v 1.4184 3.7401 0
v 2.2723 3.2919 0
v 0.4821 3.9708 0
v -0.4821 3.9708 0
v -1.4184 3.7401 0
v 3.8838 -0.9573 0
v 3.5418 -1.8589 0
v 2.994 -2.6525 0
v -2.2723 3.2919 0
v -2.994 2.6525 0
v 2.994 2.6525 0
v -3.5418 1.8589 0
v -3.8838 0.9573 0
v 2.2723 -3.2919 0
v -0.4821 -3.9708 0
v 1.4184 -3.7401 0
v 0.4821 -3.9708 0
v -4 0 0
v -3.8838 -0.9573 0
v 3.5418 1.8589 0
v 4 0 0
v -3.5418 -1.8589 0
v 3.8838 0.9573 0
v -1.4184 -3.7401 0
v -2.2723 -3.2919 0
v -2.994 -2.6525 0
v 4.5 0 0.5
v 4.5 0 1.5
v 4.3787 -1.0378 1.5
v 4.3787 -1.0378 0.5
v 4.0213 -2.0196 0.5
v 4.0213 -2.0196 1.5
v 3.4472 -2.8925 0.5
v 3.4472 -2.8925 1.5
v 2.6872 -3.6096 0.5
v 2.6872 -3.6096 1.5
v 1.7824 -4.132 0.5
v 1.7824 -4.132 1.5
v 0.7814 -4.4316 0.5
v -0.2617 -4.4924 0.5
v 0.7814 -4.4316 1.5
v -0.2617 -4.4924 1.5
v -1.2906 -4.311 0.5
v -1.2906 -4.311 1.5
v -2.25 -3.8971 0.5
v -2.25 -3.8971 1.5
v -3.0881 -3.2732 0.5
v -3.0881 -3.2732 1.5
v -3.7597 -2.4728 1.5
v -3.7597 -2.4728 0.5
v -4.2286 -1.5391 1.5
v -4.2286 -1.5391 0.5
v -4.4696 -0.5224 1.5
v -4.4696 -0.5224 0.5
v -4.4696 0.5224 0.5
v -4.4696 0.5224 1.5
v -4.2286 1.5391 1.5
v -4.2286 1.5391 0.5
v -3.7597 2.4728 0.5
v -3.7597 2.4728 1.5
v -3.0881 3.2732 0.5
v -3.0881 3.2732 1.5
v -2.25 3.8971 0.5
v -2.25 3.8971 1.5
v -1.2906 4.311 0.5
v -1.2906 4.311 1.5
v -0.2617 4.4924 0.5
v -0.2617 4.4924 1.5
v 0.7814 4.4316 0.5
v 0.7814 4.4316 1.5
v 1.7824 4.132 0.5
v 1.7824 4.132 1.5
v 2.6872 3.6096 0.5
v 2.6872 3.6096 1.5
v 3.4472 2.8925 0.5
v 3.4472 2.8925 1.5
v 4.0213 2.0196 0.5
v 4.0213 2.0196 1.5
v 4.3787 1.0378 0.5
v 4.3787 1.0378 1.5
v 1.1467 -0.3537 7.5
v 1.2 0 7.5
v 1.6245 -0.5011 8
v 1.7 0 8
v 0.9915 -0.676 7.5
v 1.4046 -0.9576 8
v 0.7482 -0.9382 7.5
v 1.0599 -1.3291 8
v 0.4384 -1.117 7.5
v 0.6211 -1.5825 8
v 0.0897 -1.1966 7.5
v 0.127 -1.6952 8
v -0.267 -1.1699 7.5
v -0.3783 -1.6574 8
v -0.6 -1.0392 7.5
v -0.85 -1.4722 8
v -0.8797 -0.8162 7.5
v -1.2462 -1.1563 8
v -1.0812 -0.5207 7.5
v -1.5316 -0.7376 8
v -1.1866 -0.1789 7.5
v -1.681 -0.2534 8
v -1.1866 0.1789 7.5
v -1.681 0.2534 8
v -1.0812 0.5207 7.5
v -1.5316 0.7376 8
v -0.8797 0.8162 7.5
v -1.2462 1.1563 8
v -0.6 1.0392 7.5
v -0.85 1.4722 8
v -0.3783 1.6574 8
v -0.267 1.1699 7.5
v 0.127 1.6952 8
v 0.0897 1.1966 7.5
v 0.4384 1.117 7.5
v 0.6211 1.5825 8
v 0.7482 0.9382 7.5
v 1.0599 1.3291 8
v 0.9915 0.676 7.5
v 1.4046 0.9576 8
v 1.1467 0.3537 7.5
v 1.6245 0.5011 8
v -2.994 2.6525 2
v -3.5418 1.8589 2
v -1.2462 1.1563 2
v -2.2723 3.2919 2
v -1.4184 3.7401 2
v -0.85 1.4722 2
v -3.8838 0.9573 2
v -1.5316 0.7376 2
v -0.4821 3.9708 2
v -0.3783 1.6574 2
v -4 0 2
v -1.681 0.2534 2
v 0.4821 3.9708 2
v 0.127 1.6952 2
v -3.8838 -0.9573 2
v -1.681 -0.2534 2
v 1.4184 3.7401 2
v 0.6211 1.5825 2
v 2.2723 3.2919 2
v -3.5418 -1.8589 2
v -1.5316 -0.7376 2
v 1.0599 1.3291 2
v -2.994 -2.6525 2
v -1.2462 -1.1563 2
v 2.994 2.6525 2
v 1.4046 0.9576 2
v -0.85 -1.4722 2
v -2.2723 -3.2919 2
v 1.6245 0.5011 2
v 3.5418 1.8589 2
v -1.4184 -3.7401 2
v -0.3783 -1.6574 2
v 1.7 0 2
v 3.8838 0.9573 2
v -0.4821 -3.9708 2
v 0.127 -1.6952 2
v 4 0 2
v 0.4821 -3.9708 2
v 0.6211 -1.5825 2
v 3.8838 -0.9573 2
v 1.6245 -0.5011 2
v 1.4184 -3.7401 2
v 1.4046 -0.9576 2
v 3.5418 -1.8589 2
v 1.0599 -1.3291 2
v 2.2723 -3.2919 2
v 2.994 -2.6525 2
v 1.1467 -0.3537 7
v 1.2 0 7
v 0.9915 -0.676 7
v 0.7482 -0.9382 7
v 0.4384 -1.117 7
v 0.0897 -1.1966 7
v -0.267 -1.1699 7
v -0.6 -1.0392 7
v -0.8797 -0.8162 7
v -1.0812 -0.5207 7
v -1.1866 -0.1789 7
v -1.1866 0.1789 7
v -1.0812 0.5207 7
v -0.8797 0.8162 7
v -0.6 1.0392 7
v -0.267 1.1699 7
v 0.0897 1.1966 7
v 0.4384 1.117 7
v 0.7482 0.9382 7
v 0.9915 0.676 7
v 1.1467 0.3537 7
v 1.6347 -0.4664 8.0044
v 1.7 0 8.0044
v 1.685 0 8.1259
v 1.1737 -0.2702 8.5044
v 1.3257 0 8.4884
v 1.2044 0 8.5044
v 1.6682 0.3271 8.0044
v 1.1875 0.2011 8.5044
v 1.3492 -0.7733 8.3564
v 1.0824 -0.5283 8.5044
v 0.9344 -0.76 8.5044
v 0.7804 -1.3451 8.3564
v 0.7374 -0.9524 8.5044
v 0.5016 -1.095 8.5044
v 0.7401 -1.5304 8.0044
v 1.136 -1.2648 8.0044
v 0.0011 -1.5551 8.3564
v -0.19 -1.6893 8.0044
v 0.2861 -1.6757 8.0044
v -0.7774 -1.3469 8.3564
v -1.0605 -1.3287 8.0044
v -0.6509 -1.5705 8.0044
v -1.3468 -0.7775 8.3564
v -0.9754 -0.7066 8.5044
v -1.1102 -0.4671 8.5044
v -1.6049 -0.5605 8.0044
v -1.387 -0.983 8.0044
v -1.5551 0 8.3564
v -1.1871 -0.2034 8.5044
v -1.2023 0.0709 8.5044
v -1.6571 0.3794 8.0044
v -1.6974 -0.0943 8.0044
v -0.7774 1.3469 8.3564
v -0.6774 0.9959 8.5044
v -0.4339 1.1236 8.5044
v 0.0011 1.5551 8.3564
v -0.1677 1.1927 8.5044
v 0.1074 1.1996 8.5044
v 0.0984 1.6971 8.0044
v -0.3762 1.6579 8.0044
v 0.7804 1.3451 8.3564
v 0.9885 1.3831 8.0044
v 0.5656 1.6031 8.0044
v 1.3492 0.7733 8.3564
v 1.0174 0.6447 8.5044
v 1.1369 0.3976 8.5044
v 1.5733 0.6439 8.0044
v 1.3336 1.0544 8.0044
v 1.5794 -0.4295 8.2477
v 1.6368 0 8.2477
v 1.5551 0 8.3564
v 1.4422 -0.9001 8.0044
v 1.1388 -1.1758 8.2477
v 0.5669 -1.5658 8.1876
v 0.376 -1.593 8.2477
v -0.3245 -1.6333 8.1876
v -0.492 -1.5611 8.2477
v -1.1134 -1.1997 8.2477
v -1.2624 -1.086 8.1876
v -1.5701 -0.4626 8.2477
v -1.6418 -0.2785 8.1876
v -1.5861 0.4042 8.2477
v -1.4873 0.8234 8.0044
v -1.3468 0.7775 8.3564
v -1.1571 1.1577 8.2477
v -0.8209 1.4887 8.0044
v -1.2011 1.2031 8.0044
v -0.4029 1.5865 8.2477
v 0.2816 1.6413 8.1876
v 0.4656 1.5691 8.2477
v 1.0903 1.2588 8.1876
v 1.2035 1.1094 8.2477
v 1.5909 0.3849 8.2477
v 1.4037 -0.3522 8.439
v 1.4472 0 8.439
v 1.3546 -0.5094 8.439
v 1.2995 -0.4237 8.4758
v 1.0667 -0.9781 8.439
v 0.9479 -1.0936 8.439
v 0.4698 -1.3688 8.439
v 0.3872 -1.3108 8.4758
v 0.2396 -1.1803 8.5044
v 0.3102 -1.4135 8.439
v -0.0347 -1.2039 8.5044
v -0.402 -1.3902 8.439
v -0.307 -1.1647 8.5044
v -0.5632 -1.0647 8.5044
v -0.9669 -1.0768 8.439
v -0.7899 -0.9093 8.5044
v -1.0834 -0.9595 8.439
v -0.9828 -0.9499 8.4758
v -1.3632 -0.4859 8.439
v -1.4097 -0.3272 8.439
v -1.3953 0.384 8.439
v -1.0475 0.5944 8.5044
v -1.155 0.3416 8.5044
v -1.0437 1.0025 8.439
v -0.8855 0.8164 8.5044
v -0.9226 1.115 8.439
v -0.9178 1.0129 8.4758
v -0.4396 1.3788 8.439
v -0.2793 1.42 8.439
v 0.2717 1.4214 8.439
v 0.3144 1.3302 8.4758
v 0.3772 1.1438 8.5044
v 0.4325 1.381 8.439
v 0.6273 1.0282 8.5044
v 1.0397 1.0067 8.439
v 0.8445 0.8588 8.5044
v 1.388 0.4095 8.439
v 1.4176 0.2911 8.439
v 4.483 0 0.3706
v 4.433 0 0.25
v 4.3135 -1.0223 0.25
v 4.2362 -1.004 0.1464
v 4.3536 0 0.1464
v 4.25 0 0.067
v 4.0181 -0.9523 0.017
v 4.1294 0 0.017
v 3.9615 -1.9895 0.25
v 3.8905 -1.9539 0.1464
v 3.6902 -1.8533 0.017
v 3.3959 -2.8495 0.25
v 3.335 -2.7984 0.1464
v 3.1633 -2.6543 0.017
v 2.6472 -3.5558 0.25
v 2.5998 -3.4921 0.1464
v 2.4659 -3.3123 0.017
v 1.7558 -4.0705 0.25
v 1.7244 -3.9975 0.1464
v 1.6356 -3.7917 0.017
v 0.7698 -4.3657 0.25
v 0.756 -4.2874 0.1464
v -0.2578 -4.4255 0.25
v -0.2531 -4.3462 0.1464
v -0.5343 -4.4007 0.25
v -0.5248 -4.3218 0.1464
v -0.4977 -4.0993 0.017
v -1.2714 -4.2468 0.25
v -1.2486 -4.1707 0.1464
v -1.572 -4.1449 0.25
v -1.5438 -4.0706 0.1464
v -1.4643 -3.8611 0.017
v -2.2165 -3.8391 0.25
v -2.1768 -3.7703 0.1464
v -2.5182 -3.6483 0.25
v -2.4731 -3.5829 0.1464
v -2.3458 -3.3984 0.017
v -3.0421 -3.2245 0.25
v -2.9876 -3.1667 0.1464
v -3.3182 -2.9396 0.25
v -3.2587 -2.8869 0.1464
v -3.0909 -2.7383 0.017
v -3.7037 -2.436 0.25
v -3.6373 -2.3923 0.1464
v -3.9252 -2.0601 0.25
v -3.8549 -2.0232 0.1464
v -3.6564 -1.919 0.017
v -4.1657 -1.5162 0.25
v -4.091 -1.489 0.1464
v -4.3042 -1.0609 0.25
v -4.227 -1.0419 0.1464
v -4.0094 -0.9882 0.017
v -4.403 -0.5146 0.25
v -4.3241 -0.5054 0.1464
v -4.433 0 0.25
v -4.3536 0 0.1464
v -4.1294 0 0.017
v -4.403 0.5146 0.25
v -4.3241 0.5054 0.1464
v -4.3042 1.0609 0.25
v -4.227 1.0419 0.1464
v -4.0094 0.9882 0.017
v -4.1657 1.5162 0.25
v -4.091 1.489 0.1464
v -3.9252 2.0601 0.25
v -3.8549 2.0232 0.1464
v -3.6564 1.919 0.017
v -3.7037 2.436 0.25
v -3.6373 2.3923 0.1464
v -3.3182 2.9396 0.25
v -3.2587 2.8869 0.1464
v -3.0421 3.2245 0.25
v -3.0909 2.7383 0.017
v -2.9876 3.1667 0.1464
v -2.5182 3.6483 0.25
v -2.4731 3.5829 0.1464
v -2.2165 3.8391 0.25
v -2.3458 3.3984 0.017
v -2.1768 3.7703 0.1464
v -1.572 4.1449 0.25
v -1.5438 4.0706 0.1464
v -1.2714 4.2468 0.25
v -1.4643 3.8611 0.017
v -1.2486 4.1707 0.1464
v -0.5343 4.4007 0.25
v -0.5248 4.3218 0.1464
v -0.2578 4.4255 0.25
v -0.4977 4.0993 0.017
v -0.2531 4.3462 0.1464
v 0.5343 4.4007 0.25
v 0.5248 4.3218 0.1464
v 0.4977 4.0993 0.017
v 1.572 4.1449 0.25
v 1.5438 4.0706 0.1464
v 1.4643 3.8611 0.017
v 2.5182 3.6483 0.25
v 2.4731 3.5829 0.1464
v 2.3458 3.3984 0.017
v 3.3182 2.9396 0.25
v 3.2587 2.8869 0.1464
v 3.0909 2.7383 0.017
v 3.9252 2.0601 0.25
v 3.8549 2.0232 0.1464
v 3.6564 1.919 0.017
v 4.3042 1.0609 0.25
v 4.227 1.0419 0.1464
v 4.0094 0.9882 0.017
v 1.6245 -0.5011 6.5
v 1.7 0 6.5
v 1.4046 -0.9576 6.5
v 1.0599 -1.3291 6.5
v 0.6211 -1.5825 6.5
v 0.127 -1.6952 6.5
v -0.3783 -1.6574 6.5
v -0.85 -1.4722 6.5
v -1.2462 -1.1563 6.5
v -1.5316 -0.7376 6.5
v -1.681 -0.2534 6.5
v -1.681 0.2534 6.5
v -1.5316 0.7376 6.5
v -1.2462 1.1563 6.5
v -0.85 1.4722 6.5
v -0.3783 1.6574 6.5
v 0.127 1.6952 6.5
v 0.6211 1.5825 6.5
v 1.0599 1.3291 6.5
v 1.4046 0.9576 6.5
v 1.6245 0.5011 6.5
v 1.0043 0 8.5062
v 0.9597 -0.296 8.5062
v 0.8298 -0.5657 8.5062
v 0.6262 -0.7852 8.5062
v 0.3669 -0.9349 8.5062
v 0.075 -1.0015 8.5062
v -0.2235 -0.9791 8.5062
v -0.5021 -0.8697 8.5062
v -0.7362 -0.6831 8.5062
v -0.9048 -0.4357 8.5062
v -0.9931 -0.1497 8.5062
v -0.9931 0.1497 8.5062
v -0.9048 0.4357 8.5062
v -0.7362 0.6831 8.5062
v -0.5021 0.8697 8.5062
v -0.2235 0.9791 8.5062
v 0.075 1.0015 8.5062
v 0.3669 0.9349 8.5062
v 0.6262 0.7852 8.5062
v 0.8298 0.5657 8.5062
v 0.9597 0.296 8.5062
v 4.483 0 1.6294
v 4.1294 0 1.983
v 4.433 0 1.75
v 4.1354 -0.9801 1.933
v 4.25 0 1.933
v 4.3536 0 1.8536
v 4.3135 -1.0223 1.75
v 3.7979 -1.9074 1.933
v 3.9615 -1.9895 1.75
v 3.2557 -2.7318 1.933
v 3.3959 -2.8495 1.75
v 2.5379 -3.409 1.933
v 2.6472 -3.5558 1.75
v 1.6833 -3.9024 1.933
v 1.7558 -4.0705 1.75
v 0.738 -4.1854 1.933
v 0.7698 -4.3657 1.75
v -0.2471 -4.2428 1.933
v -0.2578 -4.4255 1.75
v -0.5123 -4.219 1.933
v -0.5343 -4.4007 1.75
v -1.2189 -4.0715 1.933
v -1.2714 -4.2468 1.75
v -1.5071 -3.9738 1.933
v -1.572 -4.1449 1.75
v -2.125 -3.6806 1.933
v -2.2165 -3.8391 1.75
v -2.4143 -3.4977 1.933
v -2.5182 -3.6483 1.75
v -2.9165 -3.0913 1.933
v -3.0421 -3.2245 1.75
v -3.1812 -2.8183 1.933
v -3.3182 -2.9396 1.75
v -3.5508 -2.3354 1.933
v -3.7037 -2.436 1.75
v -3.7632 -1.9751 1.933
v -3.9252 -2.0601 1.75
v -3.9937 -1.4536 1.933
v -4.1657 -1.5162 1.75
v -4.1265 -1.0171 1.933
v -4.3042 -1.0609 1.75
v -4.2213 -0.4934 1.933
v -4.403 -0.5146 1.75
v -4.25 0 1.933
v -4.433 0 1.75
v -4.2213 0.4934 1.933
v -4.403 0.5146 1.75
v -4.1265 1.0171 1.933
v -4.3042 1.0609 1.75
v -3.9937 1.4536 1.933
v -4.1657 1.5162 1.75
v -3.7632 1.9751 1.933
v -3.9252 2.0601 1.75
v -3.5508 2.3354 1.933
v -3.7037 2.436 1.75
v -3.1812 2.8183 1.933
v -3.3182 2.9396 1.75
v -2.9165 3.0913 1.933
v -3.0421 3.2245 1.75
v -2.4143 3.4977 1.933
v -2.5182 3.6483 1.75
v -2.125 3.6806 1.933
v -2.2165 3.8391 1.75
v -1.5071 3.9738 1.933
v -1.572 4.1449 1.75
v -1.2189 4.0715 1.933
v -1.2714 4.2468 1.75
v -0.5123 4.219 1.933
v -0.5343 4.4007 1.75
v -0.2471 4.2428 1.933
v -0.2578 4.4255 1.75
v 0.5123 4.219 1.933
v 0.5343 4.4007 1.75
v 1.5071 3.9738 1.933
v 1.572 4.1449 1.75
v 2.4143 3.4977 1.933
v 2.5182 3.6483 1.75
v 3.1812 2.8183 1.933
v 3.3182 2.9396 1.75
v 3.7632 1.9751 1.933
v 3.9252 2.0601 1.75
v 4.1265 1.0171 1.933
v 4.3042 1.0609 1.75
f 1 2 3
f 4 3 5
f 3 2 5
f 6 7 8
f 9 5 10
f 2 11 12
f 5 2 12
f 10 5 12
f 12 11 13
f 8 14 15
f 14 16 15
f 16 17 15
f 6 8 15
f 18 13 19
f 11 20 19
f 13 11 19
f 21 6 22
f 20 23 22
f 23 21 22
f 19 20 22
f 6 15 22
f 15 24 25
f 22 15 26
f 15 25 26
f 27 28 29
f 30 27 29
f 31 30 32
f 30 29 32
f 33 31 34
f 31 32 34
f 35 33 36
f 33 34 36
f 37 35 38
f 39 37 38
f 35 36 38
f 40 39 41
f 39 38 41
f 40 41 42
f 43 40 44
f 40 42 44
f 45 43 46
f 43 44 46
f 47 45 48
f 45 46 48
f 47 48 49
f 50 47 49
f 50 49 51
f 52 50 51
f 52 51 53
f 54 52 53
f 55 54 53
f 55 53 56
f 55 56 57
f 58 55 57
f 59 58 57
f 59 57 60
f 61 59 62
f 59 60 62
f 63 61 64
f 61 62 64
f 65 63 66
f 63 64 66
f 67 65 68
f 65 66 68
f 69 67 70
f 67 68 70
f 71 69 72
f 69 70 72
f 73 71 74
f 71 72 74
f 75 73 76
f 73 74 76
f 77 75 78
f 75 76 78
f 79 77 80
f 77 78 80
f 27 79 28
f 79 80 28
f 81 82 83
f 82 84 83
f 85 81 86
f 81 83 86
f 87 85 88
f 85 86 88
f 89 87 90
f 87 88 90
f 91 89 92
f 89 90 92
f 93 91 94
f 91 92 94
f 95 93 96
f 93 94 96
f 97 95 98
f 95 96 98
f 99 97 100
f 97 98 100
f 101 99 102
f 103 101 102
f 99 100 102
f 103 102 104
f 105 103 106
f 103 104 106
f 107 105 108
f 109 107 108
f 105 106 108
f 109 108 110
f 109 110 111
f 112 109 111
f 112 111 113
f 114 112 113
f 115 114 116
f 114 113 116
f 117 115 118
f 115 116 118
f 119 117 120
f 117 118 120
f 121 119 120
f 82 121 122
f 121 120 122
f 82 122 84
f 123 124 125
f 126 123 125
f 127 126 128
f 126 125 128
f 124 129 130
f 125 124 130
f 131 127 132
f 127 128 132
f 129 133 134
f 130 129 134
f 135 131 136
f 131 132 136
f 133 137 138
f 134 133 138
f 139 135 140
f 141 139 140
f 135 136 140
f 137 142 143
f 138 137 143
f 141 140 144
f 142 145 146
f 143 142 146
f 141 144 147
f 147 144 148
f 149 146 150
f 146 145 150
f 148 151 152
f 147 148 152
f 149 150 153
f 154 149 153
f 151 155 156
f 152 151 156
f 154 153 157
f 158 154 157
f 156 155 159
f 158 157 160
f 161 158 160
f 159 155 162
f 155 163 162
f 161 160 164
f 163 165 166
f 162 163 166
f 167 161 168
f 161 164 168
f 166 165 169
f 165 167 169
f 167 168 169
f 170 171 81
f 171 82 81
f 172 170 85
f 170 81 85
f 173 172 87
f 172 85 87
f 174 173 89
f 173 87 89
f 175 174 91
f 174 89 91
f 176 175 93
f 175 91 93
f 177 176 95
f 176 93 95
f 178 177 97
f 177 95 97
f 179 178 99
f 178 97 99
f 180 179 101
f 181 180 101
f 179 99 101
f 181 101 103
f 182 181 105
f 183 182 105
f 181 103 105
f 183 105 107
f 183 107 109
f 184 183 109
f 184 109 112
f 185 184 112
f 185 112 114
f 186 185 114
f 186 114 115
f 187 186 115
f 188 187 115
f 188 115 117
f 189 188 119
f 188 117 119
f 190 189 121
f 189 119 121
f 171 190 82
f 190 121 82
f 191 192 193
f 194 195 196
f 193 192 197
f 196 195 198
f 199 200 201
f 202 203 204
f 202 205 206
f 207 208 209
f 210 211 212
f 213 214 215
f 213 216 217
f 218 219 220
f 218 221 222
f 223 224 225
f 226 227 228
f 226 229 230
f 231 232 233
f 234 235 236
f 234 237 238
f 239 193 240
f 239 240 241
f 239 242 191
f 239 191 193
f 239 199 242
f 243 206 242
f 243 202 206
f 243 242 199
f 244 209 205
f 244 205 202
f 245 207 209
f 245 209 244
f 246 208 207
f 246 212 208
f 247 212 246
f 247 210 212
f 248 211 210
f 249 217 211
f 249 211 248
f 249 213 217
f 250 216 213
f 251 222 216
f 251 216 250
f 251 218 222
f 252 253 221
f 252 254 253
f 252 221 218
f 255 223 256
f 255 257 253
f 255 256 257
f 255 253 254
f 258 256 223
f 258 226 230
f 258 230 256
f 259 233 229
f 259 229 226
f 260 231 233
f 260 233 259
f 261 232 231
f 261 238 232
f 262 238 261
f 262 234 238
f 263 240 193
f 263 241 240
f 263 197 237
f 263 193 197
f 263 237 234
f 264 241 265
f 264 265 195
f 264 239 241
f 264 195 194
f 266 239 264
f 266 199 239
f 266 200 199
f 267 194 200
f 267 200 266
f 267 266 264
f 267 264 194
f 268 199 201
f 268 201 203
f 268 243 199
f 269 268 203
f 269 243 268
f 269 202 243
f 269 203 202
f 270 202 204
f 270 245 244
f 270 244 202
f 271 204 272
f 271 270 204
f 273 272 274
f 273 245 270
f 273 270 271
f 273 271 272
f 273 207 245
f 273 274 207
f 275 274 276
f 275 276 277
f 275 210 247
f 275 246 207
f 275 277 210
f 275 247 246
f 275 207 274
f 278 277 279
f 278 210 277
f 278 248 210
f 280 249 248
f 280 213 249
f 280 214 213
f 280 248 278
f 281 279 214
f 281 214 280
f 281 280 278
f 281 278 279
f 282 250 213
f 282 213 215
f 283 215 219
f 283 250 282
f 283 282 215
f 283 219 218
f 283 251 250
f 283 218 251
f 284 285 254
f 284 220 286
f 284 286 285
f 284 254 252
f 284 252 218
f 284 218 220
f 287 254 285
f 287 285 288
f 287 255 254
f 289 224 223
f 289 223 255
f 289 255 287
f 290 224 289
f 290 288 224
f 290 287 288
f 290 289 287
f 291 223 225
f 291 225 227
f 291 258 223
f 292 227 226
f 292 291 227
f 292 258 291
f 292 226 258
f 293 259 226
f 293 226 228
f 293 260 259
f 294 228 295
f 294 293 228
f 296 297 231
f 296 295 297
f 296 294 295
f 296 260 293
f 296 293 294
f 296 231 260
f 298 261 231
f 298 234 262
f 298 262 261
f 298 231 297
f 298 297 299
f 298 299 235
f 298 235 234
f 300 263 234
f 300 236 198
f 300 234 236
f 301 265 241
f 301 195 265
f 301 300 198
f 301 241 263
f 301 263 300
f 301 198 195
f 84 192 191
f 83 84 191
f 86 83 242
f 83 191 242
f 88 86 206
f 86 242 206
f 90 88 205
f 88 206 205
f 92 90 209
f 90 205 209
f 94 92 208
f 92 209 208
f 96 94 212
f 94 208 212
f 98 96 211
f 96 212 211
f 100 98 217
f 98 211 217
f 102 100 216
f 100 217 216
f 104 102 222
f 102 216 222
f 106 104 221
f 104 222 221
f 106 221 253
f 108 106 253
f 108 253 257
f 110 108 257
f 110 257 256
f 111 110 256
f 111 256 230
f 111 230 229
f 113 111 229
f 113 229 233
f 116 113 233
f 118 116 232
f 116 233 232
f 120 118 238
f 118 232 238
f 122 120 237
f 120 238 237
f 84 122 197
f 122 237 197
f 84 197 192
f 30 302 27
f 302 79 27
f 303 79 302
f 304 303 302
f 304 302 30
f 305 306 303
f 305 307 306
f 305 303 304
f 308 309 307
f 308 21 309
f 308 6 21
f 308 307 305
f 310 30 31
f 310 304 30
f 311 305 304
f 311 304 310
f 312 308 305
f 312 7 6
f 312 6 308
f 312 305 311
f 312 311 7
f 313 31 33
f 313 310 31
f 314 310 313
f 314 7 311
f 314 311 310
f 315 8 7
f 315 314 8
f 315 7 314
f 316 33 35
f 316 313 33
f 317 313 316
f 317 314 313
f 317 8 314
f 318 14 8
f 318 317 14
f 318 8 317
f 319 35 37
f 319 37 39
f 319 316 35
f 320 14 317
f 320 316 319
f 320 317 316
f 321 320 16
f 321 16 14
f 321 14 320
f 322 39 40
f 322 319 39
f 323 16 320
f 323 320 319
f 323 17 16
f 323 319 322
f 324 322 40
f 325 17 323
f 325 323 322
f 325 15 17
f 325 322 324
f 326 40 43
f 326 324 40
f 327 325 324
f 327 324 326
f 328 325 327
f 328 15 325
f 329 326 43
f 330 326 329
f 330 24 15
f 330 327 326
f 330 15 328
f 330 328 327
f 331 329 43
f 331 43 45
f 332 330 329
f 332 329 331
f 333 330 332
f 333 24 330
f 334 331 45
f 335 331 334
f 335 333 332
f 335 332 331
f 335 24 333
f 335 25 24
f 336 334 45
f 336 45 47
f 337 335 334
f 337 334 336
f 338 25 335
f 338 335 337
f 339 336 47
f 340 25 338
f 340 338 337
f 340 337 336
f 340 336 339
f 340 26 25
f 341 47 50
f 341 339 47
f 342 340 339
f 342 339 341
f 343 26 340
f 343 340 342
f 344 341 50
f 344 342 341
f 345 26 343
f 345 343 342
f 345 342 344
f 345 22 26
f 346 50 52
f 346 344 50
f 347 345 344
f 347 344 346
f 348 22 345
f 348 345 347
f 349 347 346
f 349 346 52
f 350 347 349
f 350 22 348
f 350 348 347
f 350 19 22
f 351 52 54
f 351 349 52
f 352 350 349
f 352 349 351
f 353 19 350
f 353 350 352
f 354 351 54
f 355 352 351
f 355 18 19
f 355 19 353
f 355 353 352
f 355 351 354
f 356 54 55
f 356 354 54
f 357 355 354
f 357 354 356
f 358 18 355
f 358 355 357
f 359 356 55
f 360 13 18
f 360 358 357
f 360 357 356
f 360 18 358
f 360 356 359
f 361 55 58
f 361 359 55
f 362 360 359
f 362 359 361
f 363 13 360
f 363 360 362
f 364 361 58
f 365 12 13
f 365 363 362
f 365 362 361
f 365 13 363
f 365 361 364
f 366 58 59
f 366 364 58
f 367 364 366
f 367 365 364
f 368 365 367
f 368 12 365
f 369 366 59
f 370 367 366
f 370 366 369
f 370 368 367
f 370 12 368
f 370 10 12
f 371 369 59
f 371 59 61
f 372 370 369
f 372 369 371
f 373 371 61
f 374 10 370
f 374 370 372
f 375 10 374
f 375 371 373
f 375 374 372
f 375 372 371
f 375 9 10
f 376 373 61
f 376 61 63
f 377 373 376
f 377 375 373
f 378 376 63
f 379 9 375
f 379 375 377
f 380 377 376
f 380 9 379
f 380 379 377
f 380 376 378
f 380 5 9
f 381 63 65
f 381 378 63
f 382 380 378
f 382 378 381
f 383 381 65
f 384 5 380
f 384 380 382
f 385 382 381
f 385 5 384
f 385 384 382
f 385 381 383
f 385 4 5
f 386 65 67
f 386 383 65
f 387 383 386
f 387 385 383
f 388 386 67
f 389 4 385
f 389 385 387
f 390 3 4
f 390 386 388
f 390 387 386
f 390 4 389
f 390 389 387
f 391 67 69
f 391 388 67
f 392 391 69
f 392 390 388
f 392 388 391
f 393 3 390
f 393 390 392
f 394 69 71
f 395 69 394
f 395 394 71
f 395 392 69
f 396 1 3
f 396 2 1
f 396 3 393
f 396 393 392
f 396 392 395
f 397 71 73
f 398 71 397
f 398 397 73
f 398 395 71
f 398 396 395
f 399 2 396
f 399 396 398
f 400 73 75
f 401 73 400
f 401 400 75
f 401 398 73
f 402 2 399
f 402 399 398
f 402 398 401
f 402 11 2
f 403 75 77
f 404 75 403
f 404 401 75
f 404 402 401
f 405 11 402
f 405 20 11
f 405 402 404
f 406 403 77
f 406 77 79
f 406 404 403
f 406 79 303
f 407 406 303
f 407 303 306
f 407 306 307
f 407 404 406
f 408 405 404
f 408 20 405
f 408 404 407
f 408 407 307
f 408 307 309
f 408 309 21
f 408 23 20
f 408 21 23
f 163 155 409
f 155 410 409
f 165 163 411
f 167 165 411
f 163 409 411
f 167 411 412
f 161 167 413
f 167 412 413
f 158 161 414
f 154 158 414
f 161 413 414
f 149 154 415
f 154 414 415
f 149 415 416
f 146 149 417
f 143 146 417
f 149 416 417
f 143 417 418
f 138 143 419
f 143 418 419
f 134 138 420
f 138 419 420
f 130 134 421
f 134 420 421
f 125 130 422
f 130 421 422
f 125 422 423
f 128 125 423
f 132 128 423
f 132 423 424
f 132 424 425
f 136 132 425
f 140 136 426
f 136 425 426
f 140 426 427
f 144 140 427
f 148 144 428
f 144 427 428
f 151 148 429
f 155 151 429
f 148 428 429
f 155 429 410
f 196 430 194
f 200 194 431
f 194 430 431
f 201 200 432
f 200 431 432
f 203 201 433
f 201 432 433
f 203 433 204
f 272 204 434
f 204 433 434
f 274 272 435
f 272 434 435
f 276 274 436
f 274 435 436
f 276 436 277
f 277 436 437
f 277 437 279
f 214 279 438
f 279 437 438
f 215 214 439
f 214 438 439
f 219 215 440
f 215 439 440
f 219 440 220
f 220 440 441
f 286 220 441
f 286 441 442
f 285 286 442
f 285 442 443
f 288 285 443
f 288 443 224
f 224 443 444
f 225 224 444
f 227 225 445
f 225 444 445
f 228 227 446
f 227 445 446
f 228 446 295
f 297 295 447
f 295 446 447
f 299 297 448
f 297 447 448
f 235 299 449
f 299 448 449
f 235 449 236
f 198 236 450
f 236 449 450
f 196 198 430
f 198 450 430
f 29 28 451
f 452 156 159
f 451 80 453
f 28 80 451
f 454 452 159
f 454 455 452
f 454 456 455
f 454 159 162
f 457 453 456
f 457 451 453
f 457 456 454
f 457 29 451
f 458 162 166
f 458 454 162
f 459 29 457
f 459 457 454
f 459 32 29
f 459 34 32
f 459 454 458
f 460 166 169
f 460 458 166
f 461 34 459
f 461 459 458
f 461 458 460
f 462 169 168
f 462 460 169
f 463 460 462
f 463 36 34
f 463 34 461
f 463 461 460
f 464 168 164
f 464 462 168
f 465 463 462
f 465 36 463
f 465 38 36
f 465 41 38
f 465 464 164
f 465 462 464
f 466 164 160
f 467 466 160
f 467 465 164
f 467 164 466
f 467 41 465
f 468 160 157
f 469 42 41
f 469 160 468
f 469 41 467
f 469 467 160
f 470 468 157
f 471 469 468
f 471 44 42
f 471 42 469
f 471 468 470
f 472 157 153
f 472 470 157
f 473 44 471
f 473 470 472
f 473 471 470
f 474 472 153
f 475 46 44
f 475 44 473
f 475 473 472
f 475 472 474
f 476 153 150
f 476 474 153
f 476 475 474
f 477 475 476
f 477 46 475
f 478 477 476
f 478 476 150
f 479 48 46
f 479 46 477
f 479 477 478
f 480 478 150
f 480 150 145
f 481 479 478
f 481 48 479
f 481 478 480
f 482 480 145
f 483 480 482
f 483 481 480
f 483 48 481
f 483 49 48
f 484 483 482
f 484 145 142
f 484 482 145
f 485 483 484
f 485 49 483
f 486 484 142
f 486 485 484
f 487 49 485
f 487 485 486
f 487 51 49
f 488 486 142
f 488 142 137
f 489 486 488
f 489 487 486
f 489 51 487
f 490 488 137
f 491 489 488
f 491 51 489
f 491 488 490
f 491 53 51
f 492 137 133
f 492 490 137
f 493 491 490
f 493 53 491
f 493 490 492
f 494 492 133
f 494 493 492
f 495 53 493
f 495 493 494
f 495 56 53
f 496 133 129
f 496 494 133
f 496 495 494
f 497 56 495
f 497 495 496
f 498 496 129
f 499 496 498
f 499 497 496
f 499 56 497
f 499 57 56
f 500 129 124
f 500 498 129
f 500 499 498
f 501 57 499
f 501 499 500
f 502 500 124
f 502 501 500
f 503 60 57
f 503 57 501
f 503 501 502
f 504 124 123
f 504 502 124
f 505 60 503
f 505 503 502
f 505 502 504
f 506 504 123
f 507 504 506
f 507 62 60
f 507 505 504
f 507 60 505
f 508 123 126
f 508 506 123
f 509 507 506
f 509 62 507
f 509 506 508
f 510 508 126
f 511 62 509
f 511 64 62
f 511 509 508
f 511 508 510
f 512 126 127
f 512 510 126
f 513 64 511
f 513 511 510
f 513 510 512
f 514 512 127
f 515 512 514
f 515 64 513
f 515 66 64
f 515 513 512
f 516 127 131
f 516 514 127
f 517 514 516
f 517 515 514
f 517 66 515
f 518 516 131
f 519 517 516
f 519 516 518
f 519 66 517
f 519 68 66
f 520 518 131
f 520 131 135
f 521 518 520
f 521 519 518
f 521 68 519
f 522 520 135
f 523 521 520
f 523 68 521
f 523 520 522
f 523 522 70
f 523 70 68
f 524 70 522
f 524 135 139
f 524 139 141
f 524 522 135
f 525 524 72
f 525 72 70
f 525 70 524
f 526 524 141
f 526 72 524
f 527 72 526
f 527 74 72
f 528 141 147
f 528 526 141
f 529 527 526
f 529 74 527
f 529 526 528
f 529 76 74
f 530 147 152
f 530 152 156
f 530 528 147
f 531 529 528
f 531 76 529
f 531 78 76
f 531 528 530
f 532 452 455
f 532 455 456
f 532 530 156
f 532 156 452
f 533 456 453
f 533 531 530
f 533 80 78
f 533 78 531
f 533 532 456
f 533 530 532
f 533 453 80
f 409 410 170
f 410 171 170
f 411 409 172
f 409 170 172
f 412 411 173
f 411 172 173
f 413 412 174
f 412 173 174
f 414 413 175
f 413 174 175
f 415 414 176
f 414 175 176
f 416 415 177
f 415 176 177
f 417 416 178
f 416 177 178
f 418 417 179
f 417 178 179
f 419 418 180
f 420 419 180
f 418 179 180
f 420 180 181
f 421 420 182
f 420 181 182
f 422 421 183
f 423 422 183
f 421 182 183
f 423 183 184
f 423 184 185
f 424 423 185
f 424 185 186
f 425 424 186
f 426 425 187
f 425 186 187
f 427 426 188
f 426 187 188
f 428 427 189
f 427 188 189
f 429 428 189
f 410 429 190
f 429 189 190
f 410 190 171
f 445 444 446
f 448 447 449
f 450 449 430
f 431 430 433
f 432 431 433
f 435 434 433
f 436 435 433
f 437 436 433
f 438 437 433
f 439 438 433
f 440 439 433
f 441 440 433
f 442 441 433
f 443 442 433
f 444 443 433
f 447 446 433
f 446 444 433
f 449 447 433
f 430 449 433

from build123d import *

# Parameters (mm, degrees)
F2_R = 0.5
F3_R = 0.5


with BuildPart() as f1:
    # F0 (on Front) → F1 (revolve)
    with BuildSketch(Plane.XZ):
        Polygon((0, 8.506175), (0, 0), (4.5, 0), (4.5, 2), (1.7, 2), (1.7, 6.5), (1.2, 7), (1.2, 7.5), (1.7, 8), (1.7, 8.5), (1.004275, 8.506175), align=None)
    revolve(axis=Axis((0, 0, 4.253088), (0, 0, -1)))

    # F2
    f2_edges = [f1.edges().sort_by_distance(p)[0] for p in [
        (-1.7, 0, 8.5),
    ]]
    fillet(f2_edges, radius=F2_R)

    # F3
    f3_edges = [f1.edges().sort_by_distance(p)[0] for p in [
        (-4.5, 0, 0),
        (-4.5, 0, 2),
    ]]
    fillet(f3_edges, radius=F3_R)


solid = f1.part
